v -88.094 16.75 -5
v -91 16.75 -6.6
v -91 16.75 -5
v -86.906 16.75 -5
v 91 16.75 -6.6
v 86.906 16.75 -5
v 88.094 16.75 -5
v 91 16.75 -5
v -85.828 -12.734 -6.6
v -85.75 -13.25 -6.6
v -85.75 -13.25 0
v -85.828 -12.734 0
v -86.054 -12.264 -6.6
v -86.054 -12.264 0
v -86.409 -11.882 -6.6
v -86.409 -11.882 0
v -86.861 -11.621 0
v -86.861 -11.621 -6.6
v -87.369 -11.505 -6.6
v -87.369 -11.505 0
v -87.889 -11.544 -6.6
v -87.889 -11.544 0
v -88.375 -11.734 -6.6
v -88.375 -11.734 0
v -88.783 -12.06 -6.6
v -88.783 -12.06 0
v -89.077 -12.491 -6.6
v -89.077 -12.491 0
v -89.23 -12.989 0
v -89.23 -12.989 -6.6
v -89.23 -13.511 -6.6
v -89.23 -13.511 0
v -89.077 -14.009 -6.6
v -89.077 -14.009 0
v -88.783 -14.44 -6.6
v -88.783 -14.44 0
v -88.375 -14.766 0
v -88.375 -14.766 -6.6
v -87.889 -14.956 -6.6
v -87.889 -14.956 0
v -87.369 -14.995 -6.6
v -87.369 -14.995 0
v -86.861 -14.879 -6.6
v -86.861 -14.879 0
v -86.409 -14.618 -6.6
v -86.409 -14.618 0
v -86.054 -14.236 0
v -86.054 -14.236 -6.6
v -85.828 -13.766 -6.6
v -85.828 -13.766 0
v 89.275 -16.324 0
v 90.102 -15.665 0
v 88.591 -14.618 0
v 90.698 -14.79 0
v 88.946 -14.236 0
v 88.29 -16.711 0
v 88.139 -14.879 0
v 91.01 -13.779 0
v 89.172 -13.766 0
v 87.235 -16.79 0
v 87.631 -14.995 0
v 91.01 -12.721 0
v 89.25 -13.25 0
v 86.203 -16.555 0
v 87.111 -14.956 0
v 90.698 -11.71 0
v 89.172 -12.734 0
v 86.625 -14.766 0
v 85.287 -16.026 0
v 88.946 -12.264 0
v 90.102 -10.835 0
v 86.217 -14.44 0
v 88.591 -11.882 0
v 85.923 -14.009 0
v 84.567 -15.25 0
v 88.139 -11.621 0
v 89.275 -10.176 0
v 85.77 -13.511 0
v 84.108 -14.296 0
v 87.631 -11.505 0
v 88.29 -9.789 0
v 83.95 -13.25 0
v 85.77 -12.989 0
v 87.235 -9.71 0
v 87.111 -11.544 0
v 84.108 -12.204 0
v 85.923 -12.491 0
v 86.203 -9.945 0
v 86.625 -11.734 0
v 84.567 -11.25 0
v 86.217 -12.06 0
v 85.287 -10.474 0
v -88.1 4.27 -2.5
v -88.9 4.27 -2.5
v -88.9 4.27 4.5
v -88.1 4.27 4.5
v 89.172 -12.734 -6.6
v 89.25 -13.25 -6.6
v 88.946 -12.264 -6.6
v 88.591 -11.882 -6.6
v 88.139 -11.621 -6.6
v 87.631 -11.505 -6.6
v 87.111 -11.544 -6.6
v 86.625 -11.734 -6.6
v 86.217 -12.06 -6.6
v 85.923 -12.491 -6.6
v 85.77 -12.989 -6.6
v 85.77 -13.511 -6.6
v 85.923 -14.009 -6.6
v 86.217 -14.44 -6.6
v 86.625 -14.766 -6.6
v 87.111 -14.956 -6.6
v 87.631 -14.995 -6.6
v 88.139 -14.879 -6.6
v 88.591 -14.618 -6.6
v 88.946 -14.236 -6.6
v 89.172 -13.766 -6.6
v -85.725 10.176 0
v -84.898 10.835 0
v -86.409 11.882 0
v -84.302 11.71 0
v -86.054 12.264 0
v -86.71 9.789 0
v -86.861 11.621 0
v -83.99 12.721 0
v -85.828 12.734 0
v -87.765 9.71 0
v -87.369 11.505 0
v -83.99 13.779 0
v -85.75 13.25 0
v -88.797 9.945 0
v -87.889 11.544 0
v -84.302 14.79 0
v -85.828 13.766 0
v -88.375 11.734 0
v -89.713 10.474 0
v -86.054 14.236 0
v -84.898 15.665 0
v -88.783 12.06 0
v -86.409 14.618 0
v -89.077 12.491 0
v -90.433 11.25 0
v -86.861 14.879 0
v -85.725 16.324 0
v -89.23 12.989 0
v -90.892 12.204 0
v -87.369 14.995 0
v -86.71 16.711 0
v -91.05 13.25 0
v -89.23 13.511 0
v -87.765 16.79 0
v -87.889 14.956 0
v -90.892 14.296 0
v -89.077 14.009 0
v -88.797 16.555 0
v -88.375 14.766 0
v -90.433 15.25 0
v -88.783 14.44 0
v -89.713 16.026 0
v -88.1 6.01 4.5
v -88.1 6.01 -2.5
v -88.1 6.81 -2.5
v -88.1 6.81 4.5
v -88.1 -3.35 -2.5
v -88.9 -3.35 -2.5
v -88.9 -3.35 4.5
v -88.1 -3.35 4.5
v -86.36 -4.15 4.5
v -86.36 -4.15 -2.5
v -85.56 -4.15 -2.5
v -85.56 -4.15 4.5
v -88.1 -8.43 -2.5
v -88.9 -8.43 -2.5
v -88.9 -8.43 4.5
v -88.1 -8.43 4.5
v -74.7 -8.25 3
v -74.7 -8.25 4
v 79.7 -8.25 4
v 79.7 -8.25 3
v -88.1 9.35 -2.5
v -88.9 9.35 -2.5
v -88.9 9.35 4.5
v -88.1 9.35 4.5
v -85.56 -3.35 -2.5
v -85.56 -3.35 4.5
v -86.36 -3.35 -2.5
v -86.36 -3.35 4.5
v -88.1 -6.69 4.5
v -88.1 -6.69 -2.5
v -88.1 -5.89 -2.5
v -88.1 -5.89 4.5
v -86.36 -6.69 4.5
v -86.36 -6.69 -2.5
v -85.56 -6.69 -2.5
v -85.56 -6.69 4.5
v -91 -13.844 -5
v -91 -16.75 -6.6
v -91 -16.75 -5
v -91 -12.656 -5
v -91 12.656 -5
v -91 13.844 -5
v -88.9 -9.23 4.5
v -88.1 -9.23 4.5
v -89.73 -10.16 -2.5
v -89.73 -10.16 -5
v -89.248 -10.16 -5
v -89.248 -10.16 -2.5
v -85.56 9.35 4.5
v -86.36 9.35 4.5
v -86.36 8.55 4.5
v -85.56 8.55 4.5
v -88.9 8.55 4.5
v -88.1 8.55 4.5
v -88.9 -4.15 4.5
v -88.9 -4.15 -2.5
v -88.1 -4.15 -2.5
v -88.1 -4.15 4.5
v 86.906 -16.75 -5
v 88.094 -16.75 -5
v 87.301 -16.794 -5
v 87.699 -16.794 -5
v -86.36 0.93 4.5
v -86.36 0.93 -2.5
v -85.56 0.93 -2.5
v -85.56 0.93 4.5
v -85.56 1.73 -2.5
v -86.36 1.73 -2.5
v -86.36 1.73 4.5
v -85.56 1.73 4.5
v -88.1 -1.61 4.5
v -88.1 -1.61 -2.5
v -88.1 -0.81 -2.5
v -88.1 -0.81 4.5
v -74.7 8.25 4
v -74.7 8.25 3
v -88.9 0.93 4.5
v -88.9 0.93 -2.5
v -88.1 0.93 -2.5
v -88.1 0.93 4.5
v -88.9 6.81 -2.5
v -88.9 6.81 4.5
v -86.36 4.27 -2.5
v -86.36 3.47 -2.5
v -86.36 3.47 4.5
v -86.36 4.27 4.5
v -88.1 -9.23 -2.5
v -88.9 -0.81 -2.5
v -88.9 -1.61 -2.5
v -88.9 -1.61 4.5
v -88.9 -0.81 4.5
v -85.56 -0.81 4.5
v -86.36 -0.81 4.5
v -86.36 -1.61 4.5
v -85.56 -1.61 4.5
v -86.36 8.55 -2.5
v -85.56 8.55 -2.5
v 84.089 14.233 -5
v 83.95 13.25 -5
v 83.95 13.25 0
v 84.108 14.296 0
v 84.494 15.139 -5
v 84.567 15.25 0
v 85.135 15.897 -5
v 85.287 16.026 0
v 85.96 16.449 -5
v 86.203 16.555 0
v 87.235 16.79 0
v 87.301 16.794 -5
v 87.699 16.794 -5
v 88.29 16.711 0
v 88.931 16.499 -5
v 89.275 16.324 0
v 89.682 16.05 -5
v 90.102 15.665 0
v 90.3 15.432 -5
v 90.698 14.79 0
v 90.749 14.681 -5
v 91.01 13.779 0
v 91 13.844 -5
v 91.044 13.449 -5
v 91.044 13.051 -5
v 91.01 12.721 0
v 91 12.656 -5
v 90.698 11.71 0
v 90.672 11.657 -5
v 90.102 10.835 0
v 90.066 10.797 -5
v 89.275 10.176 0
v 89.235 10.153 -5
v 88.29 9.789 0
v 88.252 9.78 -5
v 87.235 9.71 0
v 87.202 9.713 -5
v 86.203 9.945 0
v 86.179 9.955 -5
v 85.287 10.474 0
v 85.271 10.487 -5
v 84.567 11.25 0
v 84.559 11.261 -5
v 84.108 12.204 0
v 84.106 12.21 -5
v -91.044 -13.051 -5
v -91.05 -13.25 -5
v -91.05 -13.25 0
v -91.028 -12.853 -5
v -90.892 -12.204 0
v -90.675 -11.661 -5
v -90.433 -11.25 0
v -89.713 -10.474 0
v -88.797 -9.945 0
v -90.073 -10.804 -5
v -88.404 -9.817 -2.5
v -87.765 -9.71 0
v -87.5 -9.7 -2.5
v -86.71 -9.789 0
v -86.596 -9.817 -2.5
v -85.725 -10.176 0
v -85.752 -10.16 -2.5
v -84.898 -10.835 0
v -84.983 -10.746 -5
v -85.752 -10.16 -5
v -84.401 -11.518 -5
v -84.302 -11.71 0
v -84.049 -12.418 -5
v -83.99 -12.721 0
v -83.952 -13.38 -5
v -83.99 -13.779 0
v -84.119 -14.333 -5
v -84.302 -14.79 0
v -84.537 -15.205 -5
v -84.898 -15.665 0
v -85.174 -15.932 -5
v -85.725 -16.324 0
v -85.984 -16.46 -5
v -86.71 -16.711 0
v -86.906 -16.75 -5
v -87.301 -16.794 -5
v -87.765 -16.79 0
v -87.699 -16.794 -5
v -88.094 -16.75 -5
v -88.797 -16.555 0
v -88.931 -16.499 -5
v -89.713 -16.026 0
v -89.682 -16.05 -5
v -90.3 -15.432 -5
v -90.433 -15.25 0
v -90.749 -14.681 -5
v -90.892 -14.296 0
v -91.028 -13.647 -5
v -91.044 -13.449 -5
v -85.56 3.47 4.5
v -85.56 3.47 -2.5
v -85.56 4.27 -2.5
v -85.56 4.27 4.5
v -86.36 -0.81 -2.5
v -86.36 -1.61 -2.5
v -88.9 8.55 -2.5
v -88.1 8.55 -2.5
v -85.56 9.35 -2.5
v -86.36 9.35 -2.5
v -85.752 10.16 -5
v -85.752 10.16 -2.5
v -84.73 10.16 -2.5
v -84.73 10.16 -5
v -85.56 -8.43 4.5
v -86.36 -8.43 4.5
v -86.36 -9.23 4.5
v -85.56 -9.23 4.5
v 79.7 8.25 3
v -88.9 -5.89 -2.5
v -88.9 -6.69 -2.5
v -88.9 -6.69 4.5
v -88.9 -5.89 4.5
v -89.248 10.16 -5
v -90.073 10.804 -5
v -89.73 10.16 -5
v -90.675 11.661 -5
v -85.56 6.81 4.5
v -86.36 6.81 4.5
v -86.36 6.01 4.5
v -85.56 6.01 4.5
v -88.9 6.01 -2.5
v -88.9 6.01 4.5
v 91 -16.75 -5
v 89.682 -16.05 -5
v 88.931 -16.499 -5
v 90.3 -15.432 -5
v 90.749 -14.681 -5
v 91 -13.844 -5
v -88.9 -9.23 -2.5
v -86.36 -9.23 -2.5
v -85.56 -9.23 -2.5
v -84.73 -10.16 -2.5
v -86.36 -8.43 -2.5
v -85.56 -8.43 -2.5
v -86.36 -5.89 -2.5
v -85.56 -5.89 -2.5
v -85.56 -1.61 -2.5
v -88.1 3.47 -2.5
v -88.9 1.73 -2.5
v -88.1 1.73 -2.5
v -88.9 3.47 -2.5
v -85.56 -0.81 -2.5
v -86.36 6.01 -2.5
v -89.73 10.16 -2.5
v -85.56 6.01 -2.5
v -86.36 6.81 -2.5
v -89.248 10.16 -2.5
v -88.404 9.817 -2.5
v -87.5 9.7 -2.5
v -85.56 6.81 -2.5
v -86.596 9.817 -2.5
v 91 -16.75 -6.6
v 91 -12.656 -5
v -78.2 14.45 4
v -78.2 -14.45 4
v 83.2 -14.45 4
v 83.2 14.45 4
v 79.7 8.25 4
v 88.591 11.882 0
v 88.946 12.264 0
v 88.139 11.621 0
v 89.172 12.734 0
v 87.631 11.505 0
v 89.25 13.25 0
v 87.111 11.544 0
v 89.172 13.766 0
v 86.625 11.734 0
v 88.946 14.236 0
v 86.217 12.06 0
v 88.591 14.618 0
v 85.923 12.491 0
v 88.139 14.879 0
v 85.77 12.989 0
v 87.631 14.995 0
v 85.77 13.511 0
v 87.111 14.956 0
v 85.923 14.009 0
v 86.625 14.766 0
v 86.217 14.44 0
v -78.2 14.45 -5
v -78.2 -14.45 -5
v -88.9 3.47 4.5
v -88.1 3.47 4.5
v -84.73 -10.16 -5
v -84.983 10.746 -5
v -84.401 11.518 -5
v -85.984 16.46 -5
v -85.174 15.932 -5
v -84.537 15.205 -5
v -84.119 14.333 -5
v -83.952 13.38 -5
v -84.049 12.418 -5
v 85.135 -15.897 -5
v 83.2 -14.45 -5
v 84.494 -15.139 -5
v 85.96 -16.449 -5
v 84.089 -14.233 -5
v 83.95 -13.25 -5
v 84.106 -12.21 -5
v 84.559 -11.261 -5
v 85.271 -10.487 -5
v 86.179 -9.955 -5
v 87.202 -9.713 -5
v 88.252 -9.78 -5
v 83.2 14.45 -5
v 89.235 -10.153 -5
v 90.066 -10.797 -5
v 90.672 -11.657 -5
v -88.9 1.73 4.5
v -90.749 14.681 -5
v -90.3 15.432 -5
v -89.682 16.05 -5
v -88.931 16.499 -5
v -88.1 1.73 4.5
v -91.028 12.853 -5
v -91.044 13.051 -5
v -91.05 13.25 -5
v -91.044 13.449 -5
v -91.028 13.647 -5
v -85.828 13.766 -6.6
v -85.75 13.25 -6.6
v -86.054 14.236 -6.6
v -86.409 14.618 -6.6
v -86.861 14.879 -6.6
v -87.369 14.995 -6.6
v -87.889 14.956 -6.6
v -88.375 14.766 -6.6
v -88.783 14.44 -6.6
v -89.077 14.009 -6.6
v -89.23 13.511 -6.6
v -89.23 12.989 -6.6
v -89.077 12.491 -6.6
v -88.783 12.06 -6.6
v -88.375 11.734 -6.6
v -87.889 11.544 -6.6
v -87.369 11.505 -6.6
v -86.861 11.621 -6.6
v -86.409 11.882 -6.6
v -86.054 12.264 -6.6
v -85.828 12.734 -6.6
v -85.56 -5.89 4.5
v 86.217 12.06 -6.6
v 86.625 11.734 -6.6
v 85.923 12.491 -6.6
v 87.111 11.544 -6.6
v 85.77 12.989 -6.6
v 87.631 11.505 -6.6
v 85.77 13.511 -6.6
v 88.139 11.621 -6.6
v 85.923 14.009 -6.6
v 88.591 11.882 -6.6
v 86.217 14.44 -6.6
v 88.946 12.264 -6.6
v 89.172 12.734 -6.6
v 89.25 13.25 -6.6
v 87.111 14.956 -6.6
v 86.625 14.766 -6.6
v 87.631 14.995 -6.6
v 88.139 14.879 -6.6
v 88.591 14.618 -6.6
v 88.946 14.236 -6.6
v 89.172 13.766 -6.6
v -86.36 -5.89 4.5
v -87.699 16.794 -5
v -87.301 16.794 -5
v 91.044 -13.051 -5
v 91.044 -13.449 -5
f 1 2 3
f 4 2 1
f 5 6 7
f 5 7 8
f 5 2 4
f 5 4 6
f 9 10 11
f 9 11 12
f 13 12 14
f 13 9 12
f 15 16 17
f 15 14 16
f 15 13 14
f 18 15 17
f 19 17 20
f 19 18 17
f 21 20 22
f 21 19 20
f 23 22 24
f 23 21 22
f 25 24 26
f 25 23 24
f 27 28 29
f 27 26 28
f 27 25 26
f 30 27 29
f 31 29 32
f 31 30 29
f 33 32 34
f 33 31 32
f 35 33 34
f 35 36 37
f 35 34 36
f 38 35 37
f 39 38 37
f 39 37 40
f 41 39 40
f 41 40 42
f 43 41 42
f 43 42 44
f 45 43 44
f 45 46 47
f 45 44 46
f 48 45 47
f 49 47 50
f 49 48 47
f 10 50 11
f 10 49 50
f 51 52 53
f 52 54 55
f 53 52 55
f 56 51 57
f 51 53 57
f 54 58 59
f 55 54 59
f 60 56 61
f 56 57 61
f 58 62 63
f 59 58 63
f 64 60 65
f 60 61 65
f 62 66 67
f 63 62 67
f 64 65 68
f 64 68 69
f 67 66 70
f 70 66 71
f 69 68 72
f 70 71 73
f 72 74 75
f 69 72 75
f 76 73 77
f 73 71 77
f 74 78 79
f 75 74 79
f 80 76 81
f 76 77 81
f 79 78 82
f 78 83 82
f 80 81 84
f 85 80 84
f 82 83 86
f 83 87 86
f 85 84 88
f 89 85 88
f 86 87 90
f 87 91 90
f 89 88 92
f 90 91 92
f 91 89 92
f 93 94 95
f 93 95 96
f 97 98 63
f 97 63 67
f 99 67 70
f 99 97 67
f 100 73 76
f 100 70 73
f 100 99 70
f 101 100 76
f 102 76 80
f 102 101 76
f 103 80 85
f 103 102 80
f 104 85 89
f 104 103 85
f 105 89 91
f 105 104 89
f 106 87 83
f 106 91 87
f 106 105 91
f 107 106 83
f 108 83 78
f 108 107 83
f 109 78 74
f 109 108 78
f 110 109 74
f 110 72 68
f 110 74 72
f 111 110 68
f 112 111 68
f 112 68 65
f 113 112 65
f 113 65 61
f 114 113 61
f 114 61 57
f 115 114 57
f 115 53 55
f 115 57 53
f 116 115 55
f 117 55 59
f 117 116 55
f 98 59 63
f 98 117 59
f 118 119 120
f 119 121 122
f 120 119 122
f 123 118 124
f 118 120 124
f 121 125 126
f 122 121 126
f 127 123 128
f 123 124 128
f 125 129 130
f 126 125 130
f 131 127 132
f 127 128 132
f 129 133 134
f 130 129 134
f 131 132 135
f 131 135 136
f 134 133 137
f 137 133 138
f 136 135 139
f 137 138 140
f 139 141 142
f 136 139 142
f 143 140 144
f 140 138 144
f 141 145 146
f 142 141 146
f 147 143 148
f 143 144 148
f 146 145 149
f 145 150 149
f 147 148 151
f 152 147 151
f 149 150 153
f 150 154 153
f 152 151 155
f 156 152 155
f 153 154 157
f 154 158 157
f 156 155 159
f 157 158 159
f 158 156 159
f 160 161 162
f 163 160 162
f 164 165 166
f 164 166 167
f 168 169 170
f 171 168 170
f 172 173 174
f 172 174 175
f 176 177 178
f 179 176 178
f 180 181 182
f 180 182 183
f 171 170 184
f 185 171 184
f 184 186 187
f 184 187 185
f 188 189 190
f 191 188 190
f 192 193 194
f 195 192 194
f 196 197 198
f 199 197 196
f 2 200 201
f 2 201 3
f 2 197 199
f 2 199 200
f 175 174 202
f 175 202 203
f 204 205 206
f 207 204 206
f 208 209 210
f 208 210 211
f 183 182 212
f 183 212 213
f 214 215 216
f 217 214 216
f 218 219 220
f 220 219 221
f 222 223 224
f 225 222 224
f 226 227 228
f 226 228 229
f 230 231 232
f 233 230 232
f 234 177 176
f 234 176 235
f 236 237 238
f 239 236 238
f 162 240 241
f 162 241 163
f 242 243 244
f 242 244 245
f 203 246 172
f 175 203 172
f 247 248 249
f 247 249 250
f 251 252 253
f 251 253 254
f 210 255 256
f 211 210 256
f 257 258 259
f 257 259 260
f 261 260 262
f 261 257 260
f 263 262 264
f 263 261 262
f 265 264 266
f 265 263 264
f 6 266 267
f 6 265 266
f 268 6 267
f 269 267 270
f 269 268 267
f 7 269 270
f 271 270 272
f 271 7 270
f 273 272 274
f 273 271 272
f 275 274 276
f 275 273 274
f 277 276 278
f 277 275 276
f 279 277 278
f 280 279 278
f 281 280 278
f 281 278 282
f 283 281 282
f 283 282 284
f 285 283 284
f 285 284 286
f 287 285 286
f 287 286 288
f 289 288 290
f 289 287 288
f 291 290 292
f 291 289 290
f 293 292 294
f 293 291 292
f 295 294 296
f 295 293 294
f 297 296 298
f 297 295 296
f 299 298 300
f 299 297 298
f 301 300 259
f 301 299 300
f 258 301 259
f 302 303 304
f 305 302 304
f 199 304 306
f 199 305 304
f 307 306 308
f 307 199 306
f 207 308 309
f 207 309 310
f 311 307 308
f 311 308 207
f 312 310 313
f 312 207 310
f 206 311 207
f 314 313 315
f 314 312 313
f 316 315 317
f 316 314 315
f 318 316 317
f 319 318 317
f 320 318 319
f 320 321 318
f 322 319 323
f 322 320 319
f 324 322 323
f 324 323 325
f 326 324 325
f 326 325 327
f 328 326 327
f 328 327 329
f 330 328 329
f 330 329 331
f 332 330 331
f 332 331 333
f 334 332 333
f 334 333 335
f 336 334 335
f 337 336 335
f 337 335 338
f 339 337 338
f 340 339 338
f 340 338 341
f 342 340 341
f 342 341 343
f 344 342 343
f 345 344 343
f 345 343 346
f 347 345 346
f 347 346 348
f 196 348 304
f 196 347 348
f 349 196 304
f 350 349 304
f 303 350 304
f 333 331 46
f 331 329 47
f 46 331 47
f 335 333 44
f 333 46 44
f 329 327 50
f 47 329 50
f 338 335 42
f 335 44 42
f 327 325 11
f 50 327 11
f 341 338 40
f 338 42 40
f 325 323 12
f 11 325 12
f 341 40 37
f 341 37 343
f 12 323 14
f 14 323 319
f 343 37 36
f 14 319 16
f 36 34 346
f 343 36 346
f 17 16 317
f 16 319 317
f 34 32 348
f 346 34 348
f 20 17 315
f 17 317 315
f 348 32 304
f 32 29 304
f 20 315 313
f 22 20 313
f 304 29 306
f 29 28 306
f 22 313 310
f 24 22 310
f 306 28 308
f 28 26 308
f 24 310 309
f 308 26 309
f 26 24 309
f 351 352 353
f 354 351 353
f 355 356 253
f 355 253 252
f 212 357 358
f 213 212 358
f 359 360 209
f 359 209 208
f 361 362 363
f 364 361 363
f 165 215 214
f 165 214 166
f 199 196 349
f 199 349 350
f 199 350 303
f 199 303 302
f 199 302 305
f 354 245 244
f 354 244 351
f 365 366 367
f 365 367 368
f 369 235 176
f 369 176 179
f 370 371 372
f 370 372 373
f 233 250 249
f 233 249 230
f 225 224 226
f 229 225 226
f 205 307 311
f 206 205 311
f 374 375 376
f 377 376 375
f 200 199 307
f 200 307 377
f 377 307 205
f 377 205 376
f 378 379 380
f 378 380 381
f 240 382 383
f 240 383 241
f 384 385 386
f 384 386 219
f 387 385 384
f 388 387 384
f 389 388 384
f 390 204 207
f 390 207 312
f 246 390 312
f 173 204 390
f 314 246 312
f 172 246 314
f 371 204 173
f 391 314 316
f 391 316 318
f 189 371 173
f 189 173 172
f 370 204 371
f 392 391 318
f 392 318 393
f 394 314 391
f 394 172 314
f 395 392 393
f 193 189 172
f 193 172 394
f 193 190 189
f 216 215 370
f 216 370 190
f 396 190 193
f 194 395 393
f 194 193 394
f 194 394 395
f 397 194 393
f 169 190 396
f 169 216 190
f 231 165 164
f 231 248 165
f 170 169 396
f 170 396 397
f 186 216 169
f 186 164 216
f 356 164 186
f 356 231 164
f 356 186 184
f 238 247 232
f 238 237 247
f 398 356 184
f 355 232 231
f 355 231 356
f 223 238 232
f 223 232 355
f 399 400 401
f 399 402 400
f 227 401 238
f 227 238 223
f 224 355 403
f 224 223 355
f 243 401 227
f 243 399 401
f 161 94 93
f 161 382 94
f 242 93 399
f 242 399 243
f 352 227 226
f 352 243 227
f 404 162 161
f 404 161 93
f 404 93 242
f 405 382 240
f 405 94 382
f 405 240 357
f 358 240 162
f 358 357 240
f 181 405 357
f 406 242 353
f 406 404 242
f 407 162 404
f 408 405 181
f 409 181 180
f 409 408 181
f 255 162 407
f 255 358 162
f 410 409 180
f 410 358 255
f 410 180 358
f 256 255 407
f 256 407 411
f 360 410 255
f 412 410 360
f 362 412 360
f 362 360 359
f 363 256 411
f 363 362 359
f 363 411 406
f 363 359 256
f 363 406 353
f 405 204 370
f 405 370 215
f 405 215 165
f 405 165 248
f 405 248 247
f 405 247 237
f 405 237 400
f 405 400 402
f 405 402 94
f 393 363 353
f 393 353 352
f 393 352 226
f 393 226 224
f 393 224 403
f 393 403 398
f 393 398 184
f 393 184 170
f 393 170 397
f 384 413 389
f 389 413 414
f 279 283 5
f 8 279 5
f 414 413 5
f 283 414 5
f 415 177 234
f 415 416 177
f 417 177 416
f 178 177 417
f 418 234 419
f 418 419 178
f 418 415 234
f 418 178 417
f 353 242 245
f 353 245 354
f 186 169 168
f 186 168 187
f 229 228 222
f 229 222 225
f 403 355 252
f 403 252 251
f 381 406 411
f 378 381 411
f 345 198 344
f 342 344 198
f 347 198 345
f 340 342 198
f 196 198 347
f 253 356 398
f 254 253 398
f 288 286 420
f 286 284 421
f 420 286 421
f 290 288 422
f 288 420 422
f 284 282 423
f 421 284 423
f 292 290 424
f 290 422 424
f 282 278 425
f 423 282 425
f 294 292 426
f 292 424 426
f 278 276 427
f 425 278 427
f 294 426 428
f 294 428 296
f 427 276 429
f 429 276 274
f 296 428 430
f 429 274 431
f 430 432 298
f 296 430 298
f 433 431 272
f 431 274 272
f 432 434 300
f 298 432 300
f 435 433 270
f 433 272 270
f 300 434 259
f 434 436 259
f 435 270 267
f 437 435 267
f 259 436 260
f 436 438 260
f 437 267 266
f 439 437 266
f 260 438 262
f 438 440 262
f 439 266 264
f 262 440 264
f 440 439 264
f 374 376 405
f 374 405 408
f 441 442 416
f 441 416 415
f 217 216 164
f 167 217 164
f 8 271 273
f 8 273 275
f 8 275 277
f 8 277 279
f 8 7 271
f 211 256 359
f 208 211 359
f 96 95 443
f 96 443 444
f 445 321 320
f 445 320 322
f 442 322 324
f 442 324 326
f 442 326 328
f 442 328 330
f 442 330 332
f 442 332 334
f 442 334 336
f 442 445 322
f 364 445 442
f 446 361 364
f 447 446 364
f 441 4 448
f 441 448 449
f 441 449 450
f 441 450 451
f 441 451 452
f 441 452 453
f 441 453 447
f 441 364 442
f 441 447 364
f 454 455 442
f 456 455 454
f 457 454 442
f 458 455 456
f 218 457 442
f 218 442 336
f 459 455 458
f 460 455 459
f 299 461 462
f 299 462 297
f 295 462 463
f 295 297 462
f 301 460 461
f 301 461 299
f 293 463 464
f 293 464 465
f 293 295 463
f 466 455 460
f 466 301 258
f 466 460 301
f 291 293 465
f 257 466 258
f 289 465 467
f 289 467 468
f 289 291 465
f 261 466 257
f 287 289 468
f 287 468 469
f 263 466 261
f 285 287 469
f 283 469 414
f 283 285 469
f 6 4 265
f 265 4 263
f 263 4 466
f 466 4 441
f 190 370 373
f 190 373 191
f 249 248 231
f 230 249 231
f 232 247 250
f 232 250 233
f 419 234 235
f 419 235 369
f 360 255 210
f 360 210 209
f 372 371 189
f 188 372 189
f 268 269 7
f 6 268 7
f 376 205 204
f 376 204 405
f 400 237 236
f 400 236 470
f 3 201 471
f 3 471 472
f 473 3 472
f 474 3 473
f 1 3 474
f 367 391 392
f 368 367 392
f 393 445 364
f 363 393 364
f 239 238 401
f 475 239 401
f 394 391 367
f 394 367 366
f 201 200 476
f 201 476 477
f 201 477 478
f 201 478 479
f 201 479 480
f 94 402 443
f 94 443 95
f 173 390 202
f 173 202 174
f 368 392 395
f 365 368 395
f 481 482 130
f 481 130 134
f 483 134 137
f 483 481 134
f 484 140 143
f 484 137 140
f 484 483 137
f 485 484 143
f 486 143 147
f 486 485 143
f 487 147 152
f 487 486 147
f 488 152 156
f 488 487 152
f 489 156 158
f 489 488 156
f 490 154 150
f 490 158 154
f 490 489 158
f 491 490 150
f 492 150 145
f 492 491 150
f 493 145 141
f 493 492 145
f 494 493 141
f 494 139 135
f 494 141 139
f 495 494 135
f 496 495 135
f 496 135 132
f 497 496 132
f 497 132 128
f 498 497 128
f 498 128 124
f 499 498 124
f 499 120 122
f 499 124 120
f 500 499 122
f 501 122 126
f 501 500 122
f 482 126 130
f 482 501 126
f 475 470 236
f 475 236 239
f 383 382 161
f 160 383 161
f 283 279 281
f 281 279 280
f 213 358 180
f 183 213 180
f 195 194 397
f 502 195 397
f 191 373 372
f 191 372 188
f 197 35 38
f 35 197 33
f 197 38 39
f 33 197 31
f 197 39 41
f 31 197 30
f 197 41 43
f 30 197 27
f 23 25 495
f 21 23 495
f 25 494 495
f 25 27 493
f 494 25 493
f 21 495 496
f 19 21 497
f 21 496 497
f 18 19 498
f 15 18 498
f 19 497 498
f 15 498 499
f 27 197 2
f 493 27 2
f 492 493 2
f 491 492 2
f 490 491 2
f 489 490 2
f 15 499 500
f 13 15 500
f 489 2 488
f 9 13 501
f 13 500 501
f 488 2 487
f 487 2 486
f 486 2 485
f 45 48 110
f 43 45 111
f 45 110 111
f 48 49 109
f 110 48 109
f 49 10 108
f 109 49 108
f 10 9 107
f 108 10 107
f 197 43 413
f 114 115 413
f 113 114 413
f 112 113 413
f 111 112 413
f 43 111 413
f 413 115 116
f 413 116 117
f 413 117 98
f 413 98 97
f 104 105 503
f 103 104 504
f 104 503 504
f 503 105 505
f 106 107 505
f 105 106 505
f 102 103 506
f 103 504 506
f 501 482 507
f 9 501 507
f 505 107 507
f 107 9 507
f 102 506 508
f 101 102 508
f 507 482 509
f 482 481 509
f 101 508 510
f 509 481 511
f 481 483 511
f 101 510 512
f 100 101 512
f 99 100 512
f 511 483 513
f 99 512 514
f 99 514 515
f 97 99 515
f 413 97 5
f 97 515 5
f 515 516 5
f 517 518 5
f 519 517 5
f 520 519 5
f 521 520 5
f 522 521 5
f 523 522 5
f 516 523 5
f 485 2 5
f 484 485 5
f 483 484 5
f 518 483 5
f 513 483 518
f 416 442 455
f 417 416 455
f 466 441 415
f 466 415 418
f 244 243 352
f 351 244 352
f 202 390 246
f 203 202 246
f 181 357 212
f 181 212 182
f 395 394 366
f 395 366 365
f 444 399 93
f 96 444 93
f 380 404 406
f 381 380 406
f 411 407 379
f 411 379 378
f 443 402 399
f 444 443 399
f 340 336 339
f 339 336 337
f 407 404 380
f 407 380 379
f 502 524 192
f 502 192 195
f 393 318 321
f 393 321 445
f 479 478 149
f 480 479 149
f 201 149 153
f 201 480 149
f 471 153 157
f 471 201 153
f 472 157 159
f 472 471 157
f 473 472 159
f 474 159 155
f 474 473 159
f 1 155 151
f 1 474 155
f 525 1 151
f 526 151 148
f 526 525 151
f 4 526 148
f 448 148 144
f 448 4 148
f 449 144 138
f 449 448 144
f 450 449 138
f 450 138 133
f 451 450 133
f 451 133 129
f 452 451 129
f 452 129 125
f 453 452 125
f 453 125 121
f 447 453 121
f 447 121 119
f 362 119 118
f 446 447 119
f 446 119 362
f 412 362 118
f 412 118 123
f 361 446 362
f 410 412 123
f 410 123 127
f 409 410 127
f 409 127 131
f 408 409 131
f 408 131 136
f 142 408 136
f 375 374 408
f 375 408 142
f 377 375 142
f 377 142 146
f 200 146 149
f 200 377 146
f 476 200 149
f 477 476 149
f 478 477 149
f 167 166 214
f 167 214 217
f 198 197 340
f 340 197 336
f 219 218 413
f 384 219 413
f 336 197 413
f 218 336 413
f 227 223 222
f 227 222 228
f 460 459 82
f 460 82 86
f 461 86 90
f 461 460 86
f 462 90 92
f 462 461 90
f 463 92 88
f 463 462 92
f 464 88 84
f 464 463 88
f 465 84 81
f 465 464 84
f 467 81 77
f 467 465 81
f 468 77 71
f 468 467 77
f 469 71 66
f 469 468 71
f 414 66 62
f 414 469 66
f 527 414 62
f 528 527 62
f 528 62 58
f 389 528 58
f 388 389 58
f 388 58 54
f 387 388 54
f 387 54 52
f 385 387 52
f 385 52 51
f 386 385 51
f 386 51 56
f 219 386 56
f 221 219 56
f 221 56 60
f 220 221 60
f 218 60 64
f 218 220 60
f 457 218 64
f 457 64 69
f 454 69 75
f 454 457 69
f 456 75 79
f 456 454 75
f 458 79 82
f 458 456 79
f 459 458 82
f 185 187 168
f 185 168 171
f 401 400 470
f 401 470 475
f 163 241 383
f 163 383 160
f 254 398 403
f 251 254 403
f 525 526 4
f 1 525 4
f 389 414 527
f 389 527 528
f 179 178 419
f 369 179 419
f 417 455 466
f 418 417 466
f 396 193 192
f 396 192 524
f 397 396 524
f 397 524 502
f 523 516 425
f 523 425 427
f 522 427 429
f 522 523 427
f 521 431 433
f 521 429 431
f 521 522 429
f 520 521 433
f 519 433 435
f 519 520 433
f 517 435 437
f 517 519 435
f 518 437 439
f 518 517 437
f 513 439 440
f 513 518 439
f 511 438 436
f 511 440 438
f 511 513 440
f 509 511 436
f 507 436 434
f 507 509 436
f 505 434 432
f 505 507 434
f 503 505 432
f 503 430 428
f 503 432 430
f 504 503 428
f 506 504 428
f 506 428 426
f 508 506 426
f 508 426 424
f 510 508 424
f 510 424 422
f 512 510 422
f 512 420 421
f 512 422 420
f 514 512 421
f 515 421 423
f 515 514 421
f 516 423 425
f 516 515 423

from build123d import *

# Parameters (mm, degrees)
SKETCH_2_W                  = 182
SKETCH_2_H                  = 33.5
EXTRUDE_1_DEPTH             = 1.6
SKETCH_3_W                  = 161.4
SKETCH_3_H                  = 28.9
EXTRUDE_2_DEPTH             = 9
SKETCH_4_W                  = 154.4
SKETCH_4_H                  = 16.5
CUT_EXTRUDE_1_DEPTH         = 1
SKETCH_6_R                  = 3.55
EXTRUDE_3_DEPTH             = 5
CUT_EXTRUDE_2_DEPTH         = 94.023343844
CUT_EXTRUDE_2_DEPTH_BACK    = 94.023343844
SKETCH_5_R                  = 1.75
SKETCH_9_W                  = 5
SKETCH_9_H                  = 20.32
EXTRUDE_5_DEPTH             = 2.5
SKETCH_10_W                 = 0.8
SKETCH_10_H                 = 0.8
EXTRUDE_6_DEPTH             = 7
PATTERN_LINEAR_1_COUNT      = 2
PATTERN_LINEAR_1_PITCH      = 2.54
PATTERN_LINEAR_1_COUNT_DIR2 = 8
PATTERN_LINEAR_1_PITCH_DIR2 = 2.54


with BuildPart() as part:
    # Эскиз2 → Бобышка-Вытянуть1 (new body)
    with BuildSketch(Plane.XY.offset(-6.6)):
        Rectangle(SKETCH_2_W, SKETCH_2_H)
    extrude(amount=EXTRUDE_1_DEPTH)

    # Эскиз3 → Бобышка-Вытянуть2 (add)
    with BuildSketch(Plane.XY.offset(-5)):
        with Locations((2.5, 0)):
            Rectangle(SKETCH_3_W, SKETCH_3_H)
    extrude(amount=EXTRUDE_2_DEPTH)

    # Эскиз4 → Вырез-Вытянуть1 (cut)
    with BuildSketch(Plane.XY.offset(4)):
        with Locations((2.5, 0)):
            Rectangle(SKETCH_4_W, SKETCH_4_H)
    extrude(amount=-CUT_EXTRUDE_1_DEPTH, mode=Mode.SUBTRACT)

    # Эскиз6 → Бобышка-Вытянуть3 (add)
    with BuildSketch(Plane(origin=(0, 0, -5), x_dir=(-1, 0, 0), z_dir=(0, 0, -1))):
        with Locations((-87.5, -13.25)):
            Circle(SKETCH_6_R)
        with Locations((-87.5, 13.25)):
            Circle(SKETCH_6_R)
        with Locations((87.5, 13.25)):
            Circle(SKETCH_6_R)
        with Locations((87.5, -13.25)):
            Circle(SKETCH_6_R)
    extrude(amount=-EXTRUDE_3_DEPTH)

    # Эскиз5 → Вырез-Вытянуть2 (cut, two sides: drawn at the far end of the back side and taken through both)
    with BuildSketch(Plane.XY.offset(-5).offset(-CUT_EXTRUDE_2_DEPTH_BACK)):
        with Locations((-87.5, 13.25)):
            Circle(SKETCH_5_R)
        with Locations((-87.5, -13.25)):
            Circle(SKETCH_5_R)
        with Locations((87.5, -13.25)):
            Circle(SKETCH_5_R)
        with Locations((87.5, 13.25)):
            Circle(SKETCH_5_R)
    extrude(amount=CUT_EXTRUDE_2_DEPTH + CUT_EXTRUDE_2_DEPTH_BACK, mode=Mode.SUBTRACT)

    # Эскиз9 → Бобышка-Вытянуть5 (add)
    with BuildSketch(Plane.XY.offset(-5)):
        with Locations((-87.23, 0)):
            Rectangle(SKETCH_9_W, SKETCH_9_H)
    extrude(amount=EXTRUDE_5_DEPTH)

    # Эскиз10 → Бобышка-Вытянуть6 (add)
    with BuildSketch(Plane.XY.offset(-2.5)):
        with Locations((-88.5, 8.95)):
            Rectangle(SKETCH_10_W, SKETCH_10_H)
    extrude_6 = extrude(amount=EXTRUDE_6_DEPTH)

    # Линейный массив1: Extrude 6 2 × 8
    with Locations(*[(i * PATTERN_LINEAR_1_PITCH, -j * PATTERN_LINEAR_1_PITCH_DIR2, 0) for i in range(PATTERN_LINEAR_1_COUNT) for j in range(PATTERN_LINEAR_1_COUNT_DIR2) if (i, j) != (0, 0)]):
        add(extrude_6)


solid = part.part
